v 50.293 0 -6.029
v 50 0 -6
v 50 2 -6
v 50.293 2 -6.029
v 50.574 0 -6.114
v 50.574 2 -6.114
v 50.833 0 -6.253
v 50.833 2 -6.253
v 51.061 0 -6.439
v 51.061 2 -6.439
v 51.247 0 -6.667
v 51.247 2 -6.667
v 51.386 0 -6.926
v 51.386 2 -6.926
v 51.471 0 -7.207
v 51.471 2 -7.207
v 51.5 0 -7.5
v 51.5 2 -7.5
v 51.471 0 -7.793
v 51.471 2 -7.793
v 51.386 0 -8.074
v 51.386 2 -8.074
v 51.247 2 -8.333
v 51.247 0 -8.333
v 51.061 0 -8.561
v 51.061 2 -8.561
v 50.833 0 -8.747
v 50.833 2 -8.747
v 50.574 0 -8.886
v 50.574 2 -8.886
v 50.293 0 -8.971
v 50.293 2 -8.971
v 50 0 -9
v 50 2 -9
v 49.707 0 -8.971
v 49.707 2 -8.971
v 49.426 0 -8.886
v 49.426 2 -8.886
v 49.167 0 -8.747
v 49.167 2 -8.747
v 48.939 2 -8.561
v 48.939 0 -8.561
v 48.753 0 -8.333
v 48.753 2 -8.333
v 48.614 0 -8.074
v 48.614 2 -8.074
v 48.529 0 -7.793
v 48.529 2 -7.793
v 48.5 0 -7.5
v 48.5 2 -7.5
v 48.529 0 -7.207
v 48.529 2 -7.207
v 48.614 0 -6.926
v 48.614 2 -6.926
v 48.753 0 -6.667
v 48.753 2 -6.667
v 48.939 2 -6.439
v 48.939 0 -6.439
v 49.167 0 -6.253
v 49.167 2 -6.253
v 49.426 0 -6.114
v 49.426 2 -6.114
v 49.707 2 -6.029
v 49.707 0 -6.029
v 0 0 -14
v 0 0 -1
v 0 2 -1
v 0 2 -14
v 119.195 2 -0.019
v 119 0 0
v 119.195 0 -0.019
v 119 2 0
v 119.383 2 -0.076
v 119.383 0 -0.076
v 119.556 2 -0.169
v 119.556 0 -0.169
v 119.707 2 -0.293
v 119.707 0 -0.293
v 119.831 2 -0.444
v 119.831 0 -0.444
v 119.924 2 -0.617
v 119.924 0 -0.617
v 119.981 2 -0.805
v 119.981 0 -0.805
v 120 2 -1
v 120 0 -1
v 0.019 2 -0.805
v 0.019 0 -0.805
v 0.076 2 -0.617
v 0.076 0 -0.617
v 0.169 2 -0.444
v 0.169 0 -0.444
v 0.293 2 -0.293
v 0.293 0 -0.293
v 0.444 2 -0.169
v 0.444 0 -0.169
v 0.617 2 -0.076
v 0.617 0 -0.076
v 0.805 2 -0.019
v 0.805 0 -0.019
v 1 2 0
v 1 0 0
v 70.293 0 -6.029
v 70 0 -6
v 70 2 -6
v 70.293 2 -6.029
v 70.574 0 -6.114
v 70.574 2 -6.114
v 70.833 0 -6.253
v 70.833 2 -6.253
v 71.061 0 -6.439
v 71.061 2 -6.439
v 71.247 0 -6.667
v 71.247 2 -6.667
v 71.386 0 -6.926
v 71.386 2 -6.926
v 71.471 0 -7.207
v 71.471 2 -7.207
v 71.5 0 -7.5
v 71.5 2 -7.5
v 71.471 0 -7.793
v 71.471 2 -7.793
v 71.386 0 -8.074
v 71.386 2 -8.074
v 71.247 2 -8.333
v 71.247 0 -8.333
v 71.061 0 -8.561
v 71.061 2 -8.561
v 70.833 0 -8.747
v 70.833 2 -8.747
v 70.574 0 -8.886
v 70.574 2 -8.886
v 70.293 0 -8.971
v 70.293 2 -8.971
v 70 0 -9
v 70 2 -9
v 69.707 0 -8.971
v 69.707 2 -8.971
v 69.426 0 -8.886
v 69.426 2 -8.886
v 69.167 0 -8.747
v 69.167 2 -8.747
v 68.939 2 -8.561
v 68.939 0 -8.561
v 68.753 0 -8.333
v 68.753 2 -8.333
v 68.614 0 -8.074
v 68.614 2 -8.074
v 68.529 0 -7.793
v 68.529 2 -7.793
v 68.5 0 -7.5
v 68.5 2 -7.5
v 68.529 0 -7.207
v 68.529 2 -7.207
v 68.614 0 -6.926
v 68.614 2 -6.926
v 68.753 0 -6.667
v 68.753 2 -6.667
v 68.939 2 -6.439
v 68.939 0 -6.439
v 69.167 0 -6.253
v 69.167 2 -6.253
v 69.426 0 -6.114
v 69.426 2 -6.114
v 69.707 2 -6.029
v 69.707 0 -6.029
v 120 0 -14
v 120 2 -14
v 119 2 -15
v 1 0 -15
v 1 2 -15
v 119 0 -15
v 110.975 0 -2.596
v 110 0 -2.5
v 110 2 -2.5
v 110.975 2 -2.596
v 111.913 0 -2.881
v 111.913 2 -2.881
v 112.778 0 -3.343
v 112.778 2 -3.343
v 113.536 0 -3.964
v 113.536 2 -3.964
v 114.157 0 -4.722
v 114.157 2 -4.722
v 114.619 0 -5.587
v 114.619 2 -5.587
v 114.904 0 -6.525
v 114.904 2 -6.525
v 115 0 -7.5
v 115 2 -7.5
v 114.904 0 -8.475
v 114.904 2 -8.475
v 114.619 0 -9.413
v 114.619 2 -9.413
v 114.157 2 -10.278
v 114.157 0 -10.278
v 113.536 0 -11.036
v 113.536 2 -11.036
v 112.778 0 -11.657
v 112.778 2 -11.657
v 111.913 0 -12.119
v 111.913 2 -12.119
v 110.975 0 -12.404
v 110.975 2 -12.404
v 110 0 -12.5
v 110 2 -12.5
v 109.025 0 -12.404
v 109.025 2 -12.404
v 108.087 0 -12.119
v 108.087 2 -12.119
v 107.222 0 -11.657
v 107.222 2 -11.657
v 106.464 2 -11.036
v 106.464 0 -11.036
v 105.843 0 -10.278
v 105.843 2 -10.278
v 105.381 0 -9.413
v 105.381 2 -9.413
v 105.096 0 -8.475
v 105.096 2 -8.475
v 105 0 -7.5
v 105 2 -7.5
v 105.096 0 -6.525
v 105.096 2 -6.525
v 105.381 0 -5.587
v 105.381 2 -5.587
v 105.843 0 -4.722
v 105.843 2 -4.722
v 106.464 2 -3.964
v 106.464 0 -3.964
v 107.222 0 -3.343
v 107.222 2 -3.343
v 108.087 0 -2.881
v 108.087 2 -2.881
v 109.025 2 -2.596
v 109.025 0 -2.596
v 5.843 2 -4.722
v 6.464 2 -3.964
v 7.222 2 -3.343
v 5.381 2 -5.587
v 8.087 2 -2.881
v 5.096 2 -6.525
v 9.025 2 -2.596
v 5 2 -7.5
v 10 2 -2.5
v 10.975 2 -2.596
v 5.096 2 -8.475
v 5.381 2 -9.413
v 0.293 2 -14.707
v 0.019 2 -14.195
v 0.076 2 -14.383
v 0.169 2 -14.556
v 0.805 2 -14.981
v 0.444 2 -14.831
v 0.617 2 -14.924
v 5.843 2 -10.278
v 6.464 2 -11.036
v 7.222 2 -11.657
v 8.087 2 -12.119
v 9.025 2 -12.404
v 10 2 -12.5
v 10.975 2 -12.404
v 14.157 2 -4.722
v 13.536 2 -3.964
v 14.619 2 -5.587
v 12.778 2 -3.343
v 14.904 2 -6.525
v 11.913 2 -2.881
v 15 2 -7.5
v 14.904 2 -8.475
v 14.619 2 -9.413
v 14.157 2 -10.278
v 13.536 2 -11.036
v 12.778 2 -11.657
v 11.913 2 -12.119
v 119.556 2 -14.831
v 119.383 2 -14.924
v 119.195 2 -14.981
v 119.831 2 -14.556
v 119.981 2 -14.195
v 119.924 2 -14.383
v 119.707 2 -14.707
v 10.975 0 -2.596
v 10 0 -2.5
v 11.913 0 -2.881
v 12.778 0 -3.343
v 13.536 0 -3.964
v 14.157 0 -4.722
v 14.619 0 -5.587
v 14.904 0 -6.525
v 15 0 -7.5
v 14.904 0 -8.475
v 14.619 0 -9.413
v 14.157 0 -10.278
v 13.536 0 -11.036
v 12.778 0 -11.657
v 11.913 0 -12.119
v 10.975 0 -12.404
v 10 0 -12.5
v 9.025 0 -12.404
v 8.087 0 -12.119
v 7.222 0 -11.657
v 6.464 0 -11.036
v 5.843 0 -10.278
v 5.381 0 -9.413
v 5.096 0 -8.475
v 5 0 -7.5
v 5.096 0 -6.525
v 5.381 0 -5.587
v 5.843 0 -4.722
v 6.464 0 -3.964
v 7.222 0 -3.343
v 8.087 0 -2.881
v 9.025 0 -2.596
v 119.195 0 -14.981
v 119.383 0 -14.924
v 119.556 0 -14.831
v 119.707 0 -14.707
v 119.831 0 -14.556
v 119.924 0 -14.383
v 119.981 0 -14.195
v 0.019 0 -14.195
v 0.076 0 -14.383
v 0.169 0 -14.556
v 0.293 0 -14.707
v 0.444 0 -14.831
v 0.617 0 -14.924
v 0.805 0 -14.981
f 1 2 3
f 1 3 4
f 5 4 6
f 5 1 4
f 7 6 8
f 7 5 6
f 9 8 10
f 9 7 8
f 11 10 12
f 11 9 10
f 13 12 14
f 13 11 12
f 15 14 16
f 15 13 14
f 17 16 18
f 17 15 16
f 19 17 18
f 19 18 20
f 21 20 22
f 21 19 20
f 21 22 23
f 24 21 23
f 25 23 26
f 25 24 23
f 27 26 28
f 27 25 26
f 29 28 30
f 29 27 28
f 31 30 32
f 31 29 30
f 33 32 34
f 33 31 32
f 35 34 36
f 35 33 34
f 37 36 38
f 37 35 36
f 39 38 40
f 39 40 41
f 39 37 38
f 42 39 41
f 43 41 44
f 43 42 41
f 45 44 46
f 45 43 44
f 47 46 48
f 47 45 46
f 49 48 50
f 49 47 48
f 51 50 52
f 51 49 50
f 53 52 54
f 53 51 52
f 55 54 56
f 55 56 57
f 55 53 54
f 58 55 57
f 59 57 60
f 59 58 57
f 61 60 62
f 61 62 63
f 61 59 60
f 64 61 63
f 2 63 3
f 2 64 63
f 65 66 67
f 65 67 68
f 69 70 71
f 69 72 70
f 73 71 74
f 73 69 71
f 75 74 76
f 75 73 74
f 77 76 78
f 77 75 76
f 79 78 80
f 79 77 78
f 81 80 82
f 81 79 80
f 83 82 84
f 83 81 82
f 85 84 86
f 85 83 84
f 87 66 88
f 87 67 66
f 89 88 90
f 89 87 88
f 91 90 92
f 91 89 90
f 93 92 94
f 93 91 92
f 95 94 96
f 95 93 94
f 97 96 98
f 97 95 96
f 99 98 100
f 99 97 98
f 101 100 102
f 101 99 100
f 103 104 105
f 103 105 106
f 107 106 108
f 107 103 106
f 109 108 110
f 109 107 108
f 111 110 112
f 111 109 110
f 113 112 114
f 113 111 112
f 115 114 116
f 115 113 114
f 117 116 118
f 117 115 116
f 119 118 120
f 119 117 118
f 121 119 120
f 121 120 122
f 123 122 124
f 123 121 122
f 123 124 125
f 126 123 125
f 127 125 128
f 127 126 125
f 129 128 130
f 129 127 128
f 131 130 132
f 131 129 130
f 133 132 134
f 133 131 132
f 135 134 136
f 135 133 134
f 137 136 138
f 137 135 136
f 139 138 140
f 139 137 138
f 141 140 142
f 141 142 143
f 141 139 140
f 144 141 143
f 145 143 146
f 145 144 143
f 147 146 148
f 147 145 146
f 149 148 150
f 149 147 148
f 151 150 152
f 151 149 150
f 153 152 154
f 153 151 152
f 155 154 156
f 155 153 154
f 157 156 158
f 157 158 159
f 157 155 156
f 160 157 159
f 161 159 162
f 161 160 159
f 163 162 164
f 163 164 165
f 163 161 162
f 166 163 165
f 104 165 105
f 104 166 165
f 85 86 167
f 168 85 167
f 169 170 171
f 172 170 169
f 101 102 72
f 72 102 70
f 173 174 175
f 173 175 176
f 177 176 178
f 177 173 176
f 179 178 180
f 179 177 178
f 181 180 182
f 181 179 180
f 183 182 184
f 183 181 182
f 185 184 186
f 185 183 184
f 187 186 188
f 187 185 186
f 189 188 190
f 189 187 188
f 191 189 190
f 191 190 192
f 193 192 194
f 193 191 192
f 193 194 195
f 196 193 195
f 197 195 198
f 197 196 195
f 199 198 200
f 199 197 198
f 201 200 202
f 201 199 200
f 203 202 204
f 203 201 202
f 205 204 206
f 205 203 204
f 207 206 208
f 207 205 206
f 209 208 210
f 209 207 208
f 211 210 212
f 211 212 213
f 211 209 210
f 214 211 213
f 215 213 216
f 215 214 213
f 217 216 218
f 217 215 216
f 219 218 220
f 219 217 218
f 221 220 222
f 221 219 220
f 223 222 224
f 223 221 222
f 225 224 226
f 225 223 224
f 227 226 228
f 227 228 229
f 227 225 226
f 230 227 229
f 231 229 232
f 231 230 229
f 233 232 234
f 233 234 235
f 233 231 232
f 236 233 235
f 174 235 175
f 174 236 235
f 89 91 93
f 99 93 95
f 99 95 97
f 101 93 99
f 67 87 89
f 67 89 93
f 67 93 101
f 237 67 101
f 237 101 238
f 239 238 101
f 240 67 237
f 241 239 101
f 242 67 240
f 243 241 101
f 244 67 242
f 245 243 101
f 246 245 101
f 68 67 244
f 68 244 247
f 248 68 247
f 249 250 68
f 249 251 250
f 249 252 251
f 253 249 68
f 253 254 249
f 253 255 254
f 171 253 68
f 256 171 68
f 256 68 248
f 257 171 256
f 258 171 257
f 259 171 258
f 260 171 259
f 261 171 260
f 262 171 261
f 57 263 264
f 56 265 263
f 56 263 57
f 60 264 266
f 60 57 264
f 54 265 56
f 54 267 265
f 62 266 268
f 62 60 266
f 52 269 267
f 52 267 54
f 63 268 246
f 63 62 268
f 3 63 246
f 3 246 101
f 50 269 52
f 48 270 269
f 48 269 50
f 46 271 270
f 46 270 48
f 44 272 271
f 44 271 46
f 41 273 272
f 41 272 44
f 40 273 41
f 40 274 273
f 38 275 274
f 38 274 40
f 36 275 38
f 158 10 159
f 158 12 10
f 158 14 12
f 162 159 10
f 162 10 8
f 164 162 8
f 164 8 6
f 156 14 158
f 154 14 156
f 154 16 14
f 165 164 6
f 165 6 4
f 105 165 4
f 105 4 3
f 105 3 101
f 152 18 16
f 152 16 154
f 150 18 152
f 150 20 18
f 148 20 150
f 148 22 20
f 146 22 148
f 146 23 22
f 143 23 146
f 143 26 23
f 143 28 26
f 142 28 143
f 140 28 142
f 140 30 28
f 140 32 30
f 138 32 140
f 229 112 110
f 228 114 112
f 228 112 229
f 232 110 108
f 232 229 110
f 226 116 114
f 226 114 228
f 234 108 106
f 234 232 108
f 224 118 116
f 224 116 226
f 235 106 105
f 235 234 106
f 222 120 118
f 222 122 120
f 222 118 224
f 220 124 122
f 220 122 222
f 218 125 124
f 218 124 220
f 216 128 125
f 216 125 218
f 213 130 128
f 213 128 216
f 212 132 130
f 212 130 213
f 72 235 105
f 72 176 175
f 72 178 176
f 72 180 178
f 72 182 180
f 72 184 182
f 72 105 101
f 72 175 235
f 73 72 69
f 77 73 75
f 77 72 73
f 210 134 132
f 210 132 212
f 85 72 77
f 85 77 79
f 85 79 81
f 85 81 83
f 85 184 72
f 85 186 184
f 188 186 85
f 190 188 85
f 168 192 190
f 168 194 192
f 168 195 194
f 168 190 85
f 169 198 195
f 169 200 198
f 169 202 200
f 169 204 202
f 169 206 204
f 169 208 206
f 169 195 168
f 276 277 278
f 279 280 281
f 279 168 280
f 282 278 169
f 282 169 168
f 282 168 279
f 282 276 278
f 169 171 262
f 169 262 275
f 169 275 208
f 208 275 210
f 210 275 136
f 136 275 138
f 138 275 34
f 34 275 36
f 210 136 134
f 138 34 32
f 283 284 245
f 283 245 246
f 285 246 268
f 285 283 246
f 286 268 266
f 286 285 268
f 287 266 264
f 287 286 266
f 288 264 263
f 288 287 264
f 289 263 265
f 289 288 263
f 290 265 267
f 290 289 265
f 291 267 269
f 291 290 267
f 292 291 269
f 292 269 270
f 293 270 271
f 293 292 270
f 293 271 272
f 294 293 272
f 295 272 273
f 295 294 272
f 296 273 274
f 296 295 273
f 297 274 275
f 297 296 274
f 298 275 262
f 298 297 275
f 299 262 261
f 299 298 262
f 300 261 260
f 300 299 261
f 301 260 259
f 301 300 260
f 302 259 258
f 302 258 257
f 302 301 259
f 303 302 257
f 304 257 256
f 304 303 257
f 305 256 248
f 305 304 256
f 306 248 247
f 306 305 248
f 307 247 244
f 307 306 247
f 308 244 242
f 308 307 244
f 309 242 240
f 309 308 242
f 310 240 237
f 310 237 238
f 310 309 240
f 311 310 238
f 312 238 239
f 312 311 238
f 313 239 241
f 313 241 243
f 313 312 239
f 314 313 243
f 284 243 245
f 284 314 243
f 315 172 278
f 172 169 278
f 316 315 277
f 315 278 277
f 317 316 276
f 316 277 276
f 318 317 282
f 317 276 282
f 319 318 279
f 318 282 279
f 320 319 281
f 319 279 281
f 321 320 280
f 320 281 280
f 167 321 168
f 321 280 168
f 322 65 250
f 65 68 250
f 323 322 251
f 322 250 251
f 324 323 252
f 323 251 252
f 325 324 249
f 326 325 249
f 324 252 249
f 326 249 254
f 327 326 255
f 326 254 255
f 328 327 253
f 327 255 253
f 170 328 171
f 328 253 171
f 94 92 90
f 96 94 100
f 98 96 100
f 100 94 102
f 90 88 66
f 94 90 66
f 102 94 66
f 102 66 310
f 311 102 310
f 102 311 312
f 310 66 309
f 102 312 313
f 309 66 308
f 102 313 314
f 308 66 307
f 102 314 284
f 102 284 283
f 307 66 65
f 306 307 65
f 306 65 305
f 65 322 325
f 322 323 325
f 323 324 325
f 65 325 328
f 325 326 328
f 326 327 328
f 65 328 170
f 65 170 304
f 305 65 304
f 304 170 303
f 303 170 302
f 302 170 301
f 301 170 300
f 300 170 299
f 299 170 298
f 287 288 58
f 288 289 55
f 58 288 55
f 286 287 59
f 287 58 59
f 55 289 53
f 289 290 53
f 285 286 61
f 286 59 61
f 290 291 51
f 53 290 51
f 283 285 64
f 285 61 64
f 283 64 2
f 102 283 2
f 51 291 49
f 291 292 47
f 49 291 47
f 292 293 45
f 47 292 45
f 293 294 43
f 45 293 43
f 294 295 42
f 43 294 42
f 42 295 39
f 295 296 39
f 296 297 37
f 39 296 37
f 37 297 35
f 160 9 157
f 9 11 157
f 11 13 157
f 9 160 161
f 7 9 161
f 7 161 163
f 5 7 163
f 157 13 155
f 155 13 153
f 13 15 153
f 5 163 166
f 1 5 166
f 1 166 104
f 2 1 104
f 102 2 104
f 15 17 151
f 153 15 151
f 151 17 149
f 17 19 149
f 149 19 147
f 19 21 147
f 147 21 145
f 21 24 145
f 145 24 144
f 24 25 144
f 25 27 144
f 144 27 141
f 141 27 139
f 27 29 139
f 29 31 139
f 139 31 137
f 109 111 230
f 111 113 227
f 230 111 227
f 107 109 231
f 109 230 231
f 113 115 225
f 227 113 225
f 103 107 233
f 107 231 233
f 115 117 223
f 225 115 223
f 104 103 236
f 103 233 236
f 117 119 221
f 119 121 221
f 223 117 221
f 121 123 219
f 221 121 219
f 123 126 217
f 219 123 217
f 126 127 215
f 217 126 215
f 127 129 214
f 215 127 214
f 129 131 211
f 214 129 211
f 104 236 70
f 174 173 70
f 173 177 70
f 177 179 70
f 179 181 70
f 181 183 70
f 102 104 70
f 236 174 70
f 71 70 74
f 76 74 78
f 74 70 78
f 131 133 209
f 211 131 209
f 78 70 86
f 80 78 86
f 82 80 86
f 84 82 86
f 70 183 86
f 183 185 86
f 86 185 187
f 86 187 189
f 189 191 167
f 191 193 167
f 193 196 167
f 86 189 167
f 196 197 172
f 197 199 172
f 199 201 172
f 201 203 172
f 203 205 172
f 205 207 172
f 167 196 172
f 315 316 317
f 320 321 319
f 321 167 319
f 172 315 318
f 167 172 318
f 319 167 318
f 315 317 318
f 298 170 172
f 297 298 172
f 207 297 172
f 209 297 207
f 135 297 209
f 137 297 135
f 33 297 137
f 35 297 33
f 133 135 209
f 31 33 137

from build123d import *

# Parameters (mm, degrees)
SKETCH1_W           = 120
SKETCH1_H           = 15
SKETCH1_R           = 5
SKETCH1_R_2         = 1.5
BOSS_EXTRUDE1_DEPTH = 2
FILLET1_R           = 1


with BuildPart() as part:
    # Sketch1 → Boss-Extrude1 (new body)
    with BuildSketch(Plane(origin=(0, 0, 0), x_dir=(1, 0, 0), z_dir=(0, 1, 0))):
        with Locations((60, 7.5)):
            Rectangle(SKETCH1_W, SKETCH1_H)
        with Locations(Location((10, 7.5, 0), (0, 0, 270))):
            Circle(SKETCH1_R, mode=Mode.SUBTRACT)
        with Locations(Location((110, 7.5, 0), (0, 0, 270))):
            Circle(SKETCH1_R, mode=Mode.SUBTRACT)
        with Locations(Location((50, 7.5, 0), (0, 0, 270))):
            Circle(SKETCH1_R_2, mode=Mode.SUBTRACT)
        with Locations(Location((70, 7.5, 0), (0, 0, 270))):
            Circle(SKETCH1_R_2, mode=Mode.SUBTRACT)
    extrude(amount=BOSS_EXTRUDE1_DEPTH)

    # Fillet1
    fillet1_edges = [part.edges().sort_by_distance(p)[0] for p in [
        (120, 1, 0),
        (0, 1, 0),
        (0, 1, -15),
        (120, 1, -15),
    ]]
    fillet(fillet1_edges, radius=FILLET1_R)


solid = part.part
